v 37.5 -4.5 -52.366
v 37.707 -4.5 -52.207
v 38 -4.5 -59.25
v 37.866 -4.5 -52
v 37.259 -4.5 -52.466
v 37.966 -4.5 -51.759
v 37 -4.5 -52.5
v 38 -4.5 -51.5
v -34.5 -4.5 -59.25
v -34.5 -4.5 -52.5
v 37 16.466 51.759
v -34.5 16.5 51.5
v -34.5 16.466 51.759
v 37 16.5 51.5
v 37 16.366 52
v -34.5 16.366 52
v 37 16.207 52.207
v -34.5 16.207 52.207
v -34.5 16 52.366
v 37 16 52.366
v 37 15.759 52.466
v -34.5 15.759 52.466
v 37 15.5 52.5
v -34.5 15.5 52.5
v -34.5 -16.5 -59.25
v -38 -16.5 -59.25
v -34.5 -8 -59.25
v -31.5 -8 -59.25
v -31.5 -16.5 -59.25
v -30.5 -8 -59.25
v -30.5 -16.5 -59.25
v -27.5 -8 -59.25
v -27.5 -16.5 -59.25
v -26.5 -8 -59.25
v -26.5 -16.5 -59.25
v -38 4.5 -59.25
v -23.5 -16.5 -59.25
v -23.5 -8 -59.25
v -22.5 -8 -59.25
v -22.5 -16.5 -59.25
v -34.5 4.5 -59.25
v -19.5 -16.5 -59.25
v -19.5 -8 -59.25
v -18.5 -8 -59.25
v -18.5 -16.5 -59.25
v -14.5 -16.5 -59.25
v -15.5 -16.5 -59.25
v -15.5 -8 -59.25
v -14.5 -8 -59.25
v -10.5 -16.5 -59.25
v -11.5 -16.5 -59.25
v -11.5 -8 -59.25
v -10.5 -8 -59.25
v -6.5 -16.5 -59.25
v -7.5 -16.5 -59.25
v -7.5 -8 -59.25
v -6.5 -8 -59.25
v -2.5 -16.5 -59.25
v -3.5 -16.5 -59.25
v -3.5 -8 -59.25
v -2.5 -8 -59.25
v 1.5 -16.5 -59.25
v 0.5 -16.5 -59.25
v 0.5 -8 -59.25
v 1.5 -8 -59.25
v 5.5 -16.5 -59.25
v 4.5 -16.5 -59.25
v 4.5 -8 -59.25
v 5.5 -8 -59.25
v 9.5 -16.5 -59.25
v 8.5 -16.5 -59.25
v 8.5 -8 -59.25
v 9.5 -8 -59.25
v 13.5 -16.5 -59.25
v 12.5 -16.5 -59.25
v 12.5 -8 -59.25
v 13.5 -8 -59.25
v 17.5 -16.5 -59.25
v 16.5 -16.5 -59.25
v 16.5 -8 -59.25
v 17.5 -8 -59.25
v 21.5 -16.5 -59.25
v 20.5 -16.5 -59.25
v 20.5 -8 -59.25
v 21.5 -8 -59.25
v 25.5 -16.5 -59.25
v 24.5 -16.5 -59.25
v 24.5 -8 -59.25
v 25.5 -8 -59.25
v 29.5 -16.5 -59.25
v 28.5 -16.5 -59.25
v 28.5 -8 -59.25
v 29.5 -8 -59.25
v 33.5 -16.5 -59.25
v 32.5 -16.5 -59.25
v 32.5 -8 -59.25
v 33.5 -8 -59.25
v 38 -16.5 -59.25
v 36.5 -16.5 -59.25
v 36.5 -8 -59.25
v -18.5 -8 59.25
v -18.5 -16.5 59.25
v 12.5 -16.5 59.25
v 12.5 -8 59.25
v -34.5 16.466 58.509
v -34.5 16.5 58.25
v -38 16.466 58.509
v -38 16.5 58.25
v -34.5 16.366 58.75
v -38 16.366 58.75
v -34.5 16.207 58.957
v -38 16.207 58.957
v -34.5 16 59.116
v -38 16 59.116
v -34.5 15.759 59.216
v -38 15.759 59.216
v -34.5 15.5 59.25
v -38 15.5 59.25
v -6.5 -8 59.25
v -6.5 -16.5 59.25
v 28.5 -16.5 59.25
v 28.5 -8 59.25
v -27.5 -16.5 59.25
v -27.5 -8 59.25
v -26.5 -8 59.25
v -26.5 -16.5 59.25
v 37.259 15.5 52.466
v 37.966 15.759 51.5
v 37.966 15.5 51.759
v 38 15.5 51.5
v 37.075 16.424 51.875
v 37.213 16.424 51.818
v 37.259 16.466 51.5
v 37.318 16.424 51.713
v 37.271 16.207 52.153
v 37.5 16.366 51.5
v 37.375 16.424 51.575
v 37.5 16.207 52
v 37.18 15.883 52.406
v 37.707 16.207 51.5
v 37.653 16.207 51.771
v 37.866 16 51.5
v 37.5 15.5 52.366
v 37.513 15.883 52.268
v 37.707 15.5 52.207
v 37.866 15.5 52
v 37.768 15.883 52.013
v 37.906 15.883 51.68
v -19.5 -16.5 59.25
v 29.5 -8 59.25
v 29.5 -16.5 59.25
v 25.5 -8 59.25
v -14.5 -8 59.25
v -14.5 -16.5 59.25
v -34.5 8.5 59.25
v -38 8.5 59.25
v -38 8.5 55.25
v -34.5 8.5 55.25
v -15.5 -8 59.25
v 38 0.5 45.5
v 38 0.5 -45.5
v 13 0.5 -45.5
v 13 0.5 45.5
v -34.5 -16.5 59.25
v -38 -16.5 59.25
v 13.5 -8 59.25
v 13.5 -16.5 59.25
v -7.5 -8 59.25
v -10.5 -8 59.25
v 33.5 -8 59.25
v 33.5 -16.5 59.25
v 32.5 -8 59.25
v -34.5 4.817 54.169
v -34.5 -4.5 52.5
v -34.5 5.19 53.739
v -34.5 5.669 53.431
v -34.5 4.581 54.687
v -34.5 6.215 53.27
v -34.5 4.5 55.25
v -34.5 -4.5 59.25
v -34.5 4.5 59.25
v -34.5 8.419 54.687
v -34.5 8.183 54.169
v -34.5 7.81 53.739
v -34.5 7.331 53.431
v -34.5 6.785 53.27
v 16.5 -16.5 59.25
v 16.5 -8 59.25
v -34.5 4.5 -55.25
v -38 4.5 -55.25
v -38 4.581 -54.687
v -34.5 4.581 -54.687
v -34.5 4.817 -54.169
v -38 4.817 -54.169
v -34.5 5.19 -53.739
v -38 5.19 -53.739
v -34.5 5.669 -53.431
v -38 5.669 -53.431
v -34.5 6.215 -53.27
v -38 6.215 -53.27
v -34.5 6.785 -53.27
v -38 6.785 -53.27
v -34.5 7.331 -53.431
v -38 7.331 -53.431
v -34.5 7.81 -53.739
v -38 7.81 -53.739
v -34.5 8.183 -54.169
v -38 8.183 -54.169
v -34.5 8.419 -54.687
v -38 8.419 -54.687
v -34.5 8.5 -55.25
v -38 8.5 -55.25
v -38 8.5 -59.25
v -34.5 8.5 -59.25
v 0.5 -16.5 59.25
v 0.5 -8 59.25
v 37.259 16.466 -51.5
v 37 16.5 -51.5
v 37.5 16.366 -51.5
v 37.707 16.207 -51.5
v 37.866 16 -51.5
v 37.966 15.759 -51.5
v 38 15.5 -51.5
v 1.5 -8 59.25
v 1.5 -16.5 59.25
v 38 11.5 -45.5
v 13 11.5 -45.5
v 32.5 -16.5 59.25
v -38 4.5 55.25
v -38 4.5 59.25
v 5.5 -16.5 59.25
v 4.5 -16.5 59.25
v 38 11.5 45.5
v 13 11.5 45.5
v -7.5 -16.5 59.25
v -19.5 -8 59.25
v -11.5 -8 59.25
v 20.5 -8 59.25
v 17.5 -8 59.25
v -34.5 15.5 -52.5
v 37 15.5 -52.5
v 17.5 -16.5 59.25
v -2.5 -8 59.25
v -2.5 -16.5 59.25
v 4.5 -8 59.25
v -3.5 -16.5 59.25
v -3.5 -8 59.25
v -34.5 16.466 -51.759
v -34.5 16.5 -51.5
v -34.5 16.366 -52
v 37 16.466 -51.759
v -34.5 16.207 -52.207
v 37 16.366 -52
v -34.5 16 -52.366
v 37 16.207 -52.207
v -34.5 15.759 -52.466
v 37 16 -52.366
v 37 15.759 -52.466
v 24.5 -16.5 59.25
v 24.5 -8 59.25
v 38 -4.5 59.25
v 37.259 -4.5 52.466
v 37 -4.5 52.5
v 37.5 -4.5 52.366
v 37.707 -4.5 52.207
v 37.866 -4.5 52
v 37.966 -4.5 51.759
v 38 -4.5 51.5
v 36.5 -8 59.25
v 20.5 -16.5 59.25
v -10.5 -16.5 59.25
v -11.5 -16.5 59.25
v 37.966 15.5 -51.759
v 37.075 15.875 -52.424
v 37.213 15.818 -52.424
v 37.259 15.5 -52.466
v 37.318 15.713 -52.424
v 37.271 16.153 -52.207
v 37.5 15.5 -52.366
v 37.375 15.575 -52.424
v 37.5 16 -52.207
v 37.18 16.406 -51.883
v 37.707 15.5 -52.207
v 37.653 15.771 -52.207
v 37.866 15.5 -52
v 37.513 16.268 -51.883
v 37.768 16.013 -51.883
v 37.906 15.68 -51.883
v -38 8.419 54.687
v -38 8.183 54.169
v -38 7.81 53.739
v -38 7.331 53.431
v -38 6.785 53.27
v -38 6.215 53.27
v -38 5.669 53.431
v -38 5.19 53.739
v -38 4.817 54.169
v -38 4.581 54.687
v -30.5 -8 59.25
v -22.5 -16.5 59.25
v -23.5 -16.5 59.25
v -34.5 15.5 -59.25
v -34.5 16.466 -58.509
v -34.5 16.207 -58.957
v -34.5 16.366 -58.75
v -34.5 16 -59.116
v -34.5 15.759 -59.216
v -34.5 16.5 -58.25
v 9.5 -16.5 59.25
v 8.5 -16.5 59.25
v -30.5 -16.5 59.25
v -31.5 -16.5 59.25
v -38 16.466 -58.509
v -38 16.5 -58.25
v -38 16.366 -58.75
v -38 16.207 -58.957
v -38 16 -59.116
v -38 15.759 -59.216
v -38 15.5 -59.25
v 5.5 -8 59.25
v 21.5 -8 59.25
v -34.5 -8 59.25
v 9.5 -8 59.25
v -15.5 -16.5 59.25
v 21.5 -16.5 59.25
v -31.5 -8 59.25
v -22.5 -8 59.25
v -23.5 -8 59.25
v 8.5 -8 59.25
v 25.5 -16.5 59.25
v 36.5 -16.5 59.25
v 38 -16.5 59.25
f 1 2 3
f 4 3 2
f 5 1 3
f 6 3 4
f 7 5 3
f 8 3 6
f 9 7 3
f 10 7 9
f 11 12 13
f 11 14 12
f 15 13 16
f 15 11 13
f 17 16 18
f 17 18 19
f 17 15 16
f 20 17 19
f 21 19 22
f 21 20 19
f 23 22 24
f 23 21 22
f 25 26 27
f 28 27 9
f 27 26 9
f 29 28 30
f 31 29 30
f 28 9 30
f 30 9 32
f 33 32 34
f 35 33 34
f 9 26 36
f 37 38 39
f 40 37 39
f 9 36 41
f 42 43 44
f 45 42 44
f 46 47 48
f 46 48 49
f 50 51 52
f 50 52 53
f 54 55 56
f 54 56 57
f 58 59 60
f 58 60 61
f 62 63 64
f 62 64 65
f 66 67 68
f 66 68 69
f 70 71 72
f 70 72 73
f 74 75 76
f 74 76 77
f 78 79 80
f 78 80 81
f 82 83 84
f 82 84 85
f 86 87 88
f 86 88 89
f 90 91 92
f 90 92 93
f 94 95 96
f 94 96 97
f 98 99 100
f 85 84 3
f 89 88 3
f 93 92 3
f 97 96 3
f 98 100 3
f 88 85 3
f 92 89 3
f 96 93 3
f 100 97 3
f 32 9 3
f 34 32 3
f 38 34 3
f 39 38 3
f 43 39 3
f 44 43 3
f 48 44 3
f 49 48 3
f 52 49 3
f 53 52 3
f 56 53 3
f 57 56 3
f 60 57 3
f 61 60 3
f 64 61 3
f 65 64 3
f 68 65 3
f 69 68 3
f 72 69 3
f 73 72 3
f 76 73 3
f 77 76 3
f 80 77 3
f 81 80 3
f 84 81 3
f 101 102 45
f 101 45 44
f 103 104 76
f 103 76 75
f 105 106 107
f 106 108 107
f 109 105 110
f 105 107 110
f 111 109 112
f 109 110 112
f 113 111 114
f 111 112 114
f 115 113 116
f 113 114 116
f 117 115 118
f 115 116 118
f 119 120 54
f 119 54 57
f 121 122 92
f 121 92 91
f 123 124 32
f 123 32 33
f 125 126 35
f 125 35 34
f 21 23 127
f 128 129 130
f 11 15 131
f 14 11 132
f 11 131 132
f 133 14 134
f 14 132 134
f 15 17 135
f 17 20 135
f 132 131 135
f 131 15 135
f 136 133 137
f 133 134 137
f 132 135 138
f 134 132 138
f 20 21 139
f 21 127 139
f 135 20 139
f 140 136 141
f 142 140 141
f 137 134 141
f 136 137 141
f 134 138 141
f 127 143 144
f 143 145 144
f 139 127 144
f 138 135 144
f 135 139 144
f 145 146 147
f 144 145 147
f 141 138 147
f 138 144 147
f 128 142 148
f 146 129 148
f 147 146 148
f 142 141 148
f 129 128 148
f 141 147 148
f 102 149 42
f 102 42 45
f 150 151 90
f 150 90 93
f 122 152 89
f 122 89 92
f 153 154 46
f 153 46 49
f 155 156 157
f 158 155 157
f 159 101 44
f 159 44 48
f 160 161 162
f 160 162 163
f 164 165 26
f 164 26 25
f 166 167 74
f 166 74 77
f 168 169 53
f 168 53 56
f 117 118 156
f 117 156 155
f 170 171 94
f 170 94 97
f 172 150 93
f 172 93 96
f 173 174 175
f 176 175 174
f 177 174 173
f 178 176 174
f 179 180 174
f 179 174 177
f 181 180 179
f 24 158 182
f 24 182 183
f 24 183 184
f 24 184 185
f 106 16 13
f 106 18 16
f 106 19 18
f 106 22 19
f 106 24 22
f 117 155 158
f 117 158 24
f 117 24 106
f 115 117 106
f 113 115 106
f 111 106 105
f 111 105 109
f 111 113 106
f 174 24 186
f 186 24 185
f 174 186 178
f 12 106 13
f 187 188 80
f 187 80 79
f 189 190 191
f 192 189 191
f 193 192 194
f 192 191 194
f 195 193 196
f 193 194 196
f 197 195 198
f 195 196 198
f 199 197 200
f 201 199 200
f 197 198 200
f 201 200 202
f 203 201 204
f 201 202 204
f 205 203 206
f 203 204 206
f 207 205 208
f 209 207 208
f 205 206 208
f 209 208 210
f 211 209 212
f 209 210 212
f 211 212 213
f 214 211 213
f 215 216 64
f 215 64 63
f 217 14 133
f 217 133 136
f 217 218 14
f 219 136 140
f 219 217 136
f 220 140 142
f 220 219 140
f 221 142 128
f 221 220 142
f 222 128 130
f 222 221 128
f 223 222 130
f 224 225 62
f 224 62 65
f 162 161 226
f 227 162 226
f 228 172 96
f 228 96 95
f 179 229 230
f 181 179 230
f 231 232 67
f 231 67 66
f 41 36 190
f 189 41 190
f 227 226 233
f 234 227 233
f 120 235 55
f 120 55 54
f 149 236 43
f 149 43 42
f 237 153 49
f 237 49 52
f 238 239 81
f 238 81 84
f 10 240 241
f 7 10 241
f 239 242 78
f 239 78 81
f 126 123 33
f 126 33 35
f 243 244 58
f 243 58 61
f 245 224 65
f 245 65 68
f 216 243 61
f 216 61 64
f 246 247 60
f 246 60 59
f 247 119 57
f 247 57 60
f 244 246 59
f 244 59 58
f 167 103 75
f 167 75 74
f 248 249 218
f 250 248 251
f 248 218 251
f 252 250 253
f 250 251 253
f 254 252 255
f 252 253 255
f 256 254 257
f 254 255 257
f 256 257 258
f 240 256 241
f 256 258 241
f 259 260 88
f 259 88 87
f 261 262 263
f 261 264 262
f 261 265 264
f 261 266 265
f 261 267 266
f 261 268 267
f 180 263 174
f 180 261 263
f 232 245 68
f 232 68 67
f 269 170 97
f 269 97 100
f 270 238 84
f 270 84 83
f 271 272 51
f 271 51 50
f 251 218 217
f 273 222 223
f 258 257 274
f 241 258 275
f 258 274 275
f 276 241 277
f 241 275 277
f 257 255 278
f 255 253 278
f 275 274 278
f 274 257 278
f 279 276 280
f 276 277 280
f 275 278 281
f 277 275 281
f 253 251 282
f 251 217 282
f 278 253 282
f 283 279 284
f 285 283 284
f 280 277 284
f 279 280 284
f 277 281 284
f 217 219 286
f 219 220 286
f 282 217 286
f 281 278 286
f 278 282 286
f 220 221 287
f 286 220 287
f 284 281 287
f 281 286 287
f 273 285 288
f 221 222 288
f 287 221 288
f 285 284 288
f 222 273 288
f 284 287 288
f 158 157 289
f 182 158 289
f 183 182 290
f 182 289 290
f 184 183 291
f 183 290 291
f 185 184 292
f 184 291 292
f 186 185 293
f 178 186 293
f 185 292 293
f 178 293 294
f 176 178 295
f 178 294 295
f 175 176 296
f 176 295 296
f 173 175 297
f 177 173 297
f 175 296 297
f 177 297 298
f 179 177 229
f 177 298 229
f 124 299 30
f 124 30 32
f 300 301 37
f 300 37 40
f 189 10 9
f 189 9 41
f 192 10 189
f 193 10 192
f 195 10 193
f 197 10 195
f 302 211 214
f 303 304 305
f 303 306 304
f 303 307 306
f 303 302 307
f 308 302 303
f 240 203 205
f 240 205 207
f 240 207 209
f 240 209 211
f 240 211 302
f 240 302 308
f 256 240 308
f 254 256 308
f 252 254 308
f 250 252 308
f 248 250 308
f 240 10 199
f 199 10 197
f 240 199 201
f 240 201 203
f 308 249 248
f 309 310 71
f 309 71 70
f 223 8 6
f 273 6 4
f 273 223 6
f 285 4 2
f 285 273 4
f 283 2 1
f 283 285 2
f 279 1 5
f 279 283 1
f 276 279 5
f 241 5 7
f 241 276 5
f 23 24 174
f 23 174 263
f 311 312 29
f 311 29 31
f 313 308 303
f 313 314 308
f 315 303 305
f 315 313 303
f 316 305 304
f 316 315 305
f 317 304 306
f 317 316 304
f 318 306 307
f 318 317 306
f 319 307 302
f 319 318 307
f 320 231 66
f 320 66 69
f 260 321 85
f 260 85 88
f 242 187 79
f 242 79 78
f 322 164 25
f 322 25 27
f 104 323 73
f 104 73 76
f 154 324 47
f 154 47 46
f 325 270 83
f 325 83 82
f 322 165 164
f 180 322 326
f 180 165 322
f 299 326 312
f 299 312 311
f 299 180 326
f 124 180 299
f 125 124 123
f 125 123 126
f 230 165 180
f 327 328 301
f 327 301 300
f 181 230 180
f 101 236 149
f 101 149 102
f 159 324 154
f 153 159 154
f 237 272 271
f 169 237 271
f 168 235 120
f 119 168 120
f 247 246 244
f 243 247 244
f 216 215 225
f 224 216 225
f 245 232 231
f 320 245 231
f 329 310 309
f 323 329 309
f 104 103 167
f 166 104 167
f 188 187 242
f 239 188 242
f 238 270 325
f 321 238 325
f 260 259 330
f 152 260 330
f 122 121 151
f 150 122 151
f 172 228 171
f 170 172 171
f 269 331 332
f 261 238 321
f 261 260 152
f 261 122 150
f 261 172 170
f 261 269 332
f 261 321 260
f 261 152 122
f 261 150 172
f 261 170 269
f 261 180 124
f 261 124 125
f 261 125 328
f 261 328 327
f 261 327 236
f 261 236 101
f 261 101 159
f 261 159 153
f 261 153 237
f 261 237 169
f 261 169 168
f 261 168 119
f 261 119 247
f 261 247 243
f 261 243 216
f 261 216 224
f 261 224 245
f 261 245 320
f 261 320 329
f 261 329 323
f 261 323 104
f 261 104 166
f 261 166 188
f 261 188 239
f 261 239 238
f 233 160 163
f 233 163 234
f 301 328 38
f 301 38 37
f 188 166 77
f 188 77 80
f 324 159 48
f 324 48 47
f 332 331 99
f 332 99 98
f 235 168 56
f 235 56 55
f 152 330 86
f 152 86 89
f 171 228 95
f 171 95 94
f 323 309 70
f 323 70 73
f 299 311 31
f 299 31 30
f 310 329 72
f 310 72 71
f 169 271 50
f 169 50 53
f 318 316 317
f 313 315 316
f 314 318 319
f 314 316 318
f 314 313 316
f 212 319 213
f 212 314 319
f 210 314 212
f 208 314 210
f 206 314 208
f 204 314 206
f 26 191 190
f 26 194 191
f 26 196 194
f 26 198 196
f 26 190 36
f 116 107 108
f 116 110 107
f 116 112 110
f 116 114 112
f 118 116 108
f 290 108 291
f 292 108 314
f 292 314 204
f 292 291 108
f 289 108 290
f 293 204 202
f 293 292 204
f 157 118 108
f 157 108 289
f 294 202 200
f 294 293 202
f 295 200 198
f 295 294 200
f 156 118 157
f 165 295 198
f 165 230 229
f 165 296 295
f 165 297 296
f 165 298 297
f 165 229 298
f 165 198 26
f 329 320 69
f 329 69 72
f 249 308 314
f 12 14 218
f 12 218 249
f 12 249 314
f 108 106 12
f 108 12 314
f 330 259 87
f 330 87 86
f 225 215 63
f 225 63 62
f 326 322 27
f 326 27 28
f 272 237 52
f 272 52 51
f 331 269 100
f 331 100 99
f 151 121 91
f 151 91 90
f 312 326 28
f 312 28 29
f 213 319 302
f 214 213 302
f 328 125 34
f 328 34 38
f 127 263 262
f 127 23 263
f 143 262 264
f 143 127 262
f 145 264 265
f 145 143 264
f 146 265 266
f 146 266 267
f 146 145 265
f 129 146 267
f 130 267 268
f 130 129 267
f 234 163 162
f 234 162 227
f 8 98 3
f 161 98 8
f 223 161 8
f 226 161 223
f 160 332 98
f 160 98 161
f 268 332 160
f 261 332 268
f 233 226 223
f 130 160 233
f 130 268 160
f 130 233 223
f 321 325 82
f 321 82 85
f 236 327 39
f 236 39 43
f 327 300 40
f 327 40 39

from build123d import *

# Parameters (mm, degrees)
F2_DEPTH = 59.25
F1_W     = 72.5
F1_H     = 21
F3_DEPTH = 52.5
F5_DEPTH = 3.5
F6_W     = 11
F6_H     = 91
F7_DEPTH = 25
F8_R     = 1


with BuildPart() as f2:
    # F1 (on Top) → F2 (new body, symmetric)
    with BuildSketch(Plane.XY):
        Polygon((-34.5, 16.5), (-38, 16.5), (-38, -16.5), (-34.5, -16.5), (-34.5, -8), (-31.5, -8), (-31.5, -16.5), (-30.5, -16.5), (-30.5, -8), (-27.5, -8), (-27.5, -16.5), (-26.5, -16.5), (-26.5, -8), (-23.5, -8), (-23.5, -16.5), (-22.5, -16.5), (-22.5, -8), (-19.5, -8), (-19.5, -16.5), (-18.5, -16.5), (-18.5, -8), (-15.5, -8), (-15.5, -16.5), (-14.5, -16.5), (-14.5, -8), (-11.5, -8), (-11.5, -16.5), (-10.5, -16.5), (-10.5, -8), (-7.5, -8), (-7.5, -16.5), (-6.5, -16.5), (-6.5, -8), (-3.5, -8), (-3.5, -16.5), (-2.5, -16.5), (-2.5, -8), (0.5, -8), (0.5, -16.5), (1.5, -16.5), (1.5, -8), (4.5, -8), (4.5, -16.5), (5.5, -16.5), (5.5, -8), (8.5, -8), (8.5, -16.5), (9.5, -16.5), (9.5, -8), (12.5, -8), (12.5, -16.5), (13.5, -16.5), (13.5, -8), (16.5, -8), (16.5, -16.5), (17.5, -16.5), (17.5, -8), (20.5, -8), (20.5, -16.5), (21.5, -16.5), (21.5, -8), (24.5, -8), (24.5, -16.5), (25.5, -16.5), (25.5, -8), (28.5, -8), (28.5, -16.5), (29.5, -16.5), (29.5, -8), (32.5, -8), (32.5, -16.5), (33.5, -16.5), (33.5, -8), (36.5, -8), (36.5, -16.5), (38, -16.5), (38, -4.5), (-34.5, -4.5), align=None)
    extrude(amount=F2_DEPTH, both=True)

    # F1 (on Top) → F3 (join, symmetric)
    with BuildSketch(Plane.XY):
        with Locations((1.75, 6)):
            Rectangle(F1_W, F1_H)
    extrude(amount=F3_DEPTH, both=True)

    # F4 (on face) → F5 (cut, through all)
    with BuildSketch(Plane(origin=(-38, 0, 0), x_dir=(0, -1, 0), z_dir=(-1, 0, 0))):
        with BuildLine():
            Line((-4.5, 59.25), (-8.5, 59.25))
            Line((-8.5, 59.25), (-8.5, 55.25))
            ThreePointArc((-8.5, 55.25), (-6.5, 53.25), (-4.5, 55.25))
            Line((-4.5, 55.25), (-4.5, 59.25))
        make_face()
        with BuildLine():
            Line((-8.5, -55.25), (-8.5, -59.25))
            Line((-8.5, -59.25), (-4.5, -59.25))
            Line((-4.5, -59.25), (-4.5, -55.25))
            ThreePointArc((-4.5, -55.25), (-6.5, -53.25), (-8.5, -55.25))
        make_face()
    extrude(amount=-F5_DEPTH, mode=Mode.SUBTRACT)

    # F6 (on face) → F7 (cut)
    with BuildSketch(Plane.YZ.offset(38)):
        with Locations((6, 0)):
            Rectangle(F6_W, F6_H)
    extrude(amount=-F7_DEPTH, mode=Mode.SUBTRACT)

    # F8
    f8_edges = [f2.edges().sort_by_distance(p)[0] for p in [
        (38, 6, 52.5),
        (1.75, 16.5, 52.5),
        (38, 16.5, 0),
        (-36.25, 16.5, 59.25),
        (1.75, 16.5, -52.5),
        (38, 6, -52.5),
        (-36.25, 16.5, -59.25),
    ]]
    fillet(f8_edges, radius=F8_R)


solid = f2.part
